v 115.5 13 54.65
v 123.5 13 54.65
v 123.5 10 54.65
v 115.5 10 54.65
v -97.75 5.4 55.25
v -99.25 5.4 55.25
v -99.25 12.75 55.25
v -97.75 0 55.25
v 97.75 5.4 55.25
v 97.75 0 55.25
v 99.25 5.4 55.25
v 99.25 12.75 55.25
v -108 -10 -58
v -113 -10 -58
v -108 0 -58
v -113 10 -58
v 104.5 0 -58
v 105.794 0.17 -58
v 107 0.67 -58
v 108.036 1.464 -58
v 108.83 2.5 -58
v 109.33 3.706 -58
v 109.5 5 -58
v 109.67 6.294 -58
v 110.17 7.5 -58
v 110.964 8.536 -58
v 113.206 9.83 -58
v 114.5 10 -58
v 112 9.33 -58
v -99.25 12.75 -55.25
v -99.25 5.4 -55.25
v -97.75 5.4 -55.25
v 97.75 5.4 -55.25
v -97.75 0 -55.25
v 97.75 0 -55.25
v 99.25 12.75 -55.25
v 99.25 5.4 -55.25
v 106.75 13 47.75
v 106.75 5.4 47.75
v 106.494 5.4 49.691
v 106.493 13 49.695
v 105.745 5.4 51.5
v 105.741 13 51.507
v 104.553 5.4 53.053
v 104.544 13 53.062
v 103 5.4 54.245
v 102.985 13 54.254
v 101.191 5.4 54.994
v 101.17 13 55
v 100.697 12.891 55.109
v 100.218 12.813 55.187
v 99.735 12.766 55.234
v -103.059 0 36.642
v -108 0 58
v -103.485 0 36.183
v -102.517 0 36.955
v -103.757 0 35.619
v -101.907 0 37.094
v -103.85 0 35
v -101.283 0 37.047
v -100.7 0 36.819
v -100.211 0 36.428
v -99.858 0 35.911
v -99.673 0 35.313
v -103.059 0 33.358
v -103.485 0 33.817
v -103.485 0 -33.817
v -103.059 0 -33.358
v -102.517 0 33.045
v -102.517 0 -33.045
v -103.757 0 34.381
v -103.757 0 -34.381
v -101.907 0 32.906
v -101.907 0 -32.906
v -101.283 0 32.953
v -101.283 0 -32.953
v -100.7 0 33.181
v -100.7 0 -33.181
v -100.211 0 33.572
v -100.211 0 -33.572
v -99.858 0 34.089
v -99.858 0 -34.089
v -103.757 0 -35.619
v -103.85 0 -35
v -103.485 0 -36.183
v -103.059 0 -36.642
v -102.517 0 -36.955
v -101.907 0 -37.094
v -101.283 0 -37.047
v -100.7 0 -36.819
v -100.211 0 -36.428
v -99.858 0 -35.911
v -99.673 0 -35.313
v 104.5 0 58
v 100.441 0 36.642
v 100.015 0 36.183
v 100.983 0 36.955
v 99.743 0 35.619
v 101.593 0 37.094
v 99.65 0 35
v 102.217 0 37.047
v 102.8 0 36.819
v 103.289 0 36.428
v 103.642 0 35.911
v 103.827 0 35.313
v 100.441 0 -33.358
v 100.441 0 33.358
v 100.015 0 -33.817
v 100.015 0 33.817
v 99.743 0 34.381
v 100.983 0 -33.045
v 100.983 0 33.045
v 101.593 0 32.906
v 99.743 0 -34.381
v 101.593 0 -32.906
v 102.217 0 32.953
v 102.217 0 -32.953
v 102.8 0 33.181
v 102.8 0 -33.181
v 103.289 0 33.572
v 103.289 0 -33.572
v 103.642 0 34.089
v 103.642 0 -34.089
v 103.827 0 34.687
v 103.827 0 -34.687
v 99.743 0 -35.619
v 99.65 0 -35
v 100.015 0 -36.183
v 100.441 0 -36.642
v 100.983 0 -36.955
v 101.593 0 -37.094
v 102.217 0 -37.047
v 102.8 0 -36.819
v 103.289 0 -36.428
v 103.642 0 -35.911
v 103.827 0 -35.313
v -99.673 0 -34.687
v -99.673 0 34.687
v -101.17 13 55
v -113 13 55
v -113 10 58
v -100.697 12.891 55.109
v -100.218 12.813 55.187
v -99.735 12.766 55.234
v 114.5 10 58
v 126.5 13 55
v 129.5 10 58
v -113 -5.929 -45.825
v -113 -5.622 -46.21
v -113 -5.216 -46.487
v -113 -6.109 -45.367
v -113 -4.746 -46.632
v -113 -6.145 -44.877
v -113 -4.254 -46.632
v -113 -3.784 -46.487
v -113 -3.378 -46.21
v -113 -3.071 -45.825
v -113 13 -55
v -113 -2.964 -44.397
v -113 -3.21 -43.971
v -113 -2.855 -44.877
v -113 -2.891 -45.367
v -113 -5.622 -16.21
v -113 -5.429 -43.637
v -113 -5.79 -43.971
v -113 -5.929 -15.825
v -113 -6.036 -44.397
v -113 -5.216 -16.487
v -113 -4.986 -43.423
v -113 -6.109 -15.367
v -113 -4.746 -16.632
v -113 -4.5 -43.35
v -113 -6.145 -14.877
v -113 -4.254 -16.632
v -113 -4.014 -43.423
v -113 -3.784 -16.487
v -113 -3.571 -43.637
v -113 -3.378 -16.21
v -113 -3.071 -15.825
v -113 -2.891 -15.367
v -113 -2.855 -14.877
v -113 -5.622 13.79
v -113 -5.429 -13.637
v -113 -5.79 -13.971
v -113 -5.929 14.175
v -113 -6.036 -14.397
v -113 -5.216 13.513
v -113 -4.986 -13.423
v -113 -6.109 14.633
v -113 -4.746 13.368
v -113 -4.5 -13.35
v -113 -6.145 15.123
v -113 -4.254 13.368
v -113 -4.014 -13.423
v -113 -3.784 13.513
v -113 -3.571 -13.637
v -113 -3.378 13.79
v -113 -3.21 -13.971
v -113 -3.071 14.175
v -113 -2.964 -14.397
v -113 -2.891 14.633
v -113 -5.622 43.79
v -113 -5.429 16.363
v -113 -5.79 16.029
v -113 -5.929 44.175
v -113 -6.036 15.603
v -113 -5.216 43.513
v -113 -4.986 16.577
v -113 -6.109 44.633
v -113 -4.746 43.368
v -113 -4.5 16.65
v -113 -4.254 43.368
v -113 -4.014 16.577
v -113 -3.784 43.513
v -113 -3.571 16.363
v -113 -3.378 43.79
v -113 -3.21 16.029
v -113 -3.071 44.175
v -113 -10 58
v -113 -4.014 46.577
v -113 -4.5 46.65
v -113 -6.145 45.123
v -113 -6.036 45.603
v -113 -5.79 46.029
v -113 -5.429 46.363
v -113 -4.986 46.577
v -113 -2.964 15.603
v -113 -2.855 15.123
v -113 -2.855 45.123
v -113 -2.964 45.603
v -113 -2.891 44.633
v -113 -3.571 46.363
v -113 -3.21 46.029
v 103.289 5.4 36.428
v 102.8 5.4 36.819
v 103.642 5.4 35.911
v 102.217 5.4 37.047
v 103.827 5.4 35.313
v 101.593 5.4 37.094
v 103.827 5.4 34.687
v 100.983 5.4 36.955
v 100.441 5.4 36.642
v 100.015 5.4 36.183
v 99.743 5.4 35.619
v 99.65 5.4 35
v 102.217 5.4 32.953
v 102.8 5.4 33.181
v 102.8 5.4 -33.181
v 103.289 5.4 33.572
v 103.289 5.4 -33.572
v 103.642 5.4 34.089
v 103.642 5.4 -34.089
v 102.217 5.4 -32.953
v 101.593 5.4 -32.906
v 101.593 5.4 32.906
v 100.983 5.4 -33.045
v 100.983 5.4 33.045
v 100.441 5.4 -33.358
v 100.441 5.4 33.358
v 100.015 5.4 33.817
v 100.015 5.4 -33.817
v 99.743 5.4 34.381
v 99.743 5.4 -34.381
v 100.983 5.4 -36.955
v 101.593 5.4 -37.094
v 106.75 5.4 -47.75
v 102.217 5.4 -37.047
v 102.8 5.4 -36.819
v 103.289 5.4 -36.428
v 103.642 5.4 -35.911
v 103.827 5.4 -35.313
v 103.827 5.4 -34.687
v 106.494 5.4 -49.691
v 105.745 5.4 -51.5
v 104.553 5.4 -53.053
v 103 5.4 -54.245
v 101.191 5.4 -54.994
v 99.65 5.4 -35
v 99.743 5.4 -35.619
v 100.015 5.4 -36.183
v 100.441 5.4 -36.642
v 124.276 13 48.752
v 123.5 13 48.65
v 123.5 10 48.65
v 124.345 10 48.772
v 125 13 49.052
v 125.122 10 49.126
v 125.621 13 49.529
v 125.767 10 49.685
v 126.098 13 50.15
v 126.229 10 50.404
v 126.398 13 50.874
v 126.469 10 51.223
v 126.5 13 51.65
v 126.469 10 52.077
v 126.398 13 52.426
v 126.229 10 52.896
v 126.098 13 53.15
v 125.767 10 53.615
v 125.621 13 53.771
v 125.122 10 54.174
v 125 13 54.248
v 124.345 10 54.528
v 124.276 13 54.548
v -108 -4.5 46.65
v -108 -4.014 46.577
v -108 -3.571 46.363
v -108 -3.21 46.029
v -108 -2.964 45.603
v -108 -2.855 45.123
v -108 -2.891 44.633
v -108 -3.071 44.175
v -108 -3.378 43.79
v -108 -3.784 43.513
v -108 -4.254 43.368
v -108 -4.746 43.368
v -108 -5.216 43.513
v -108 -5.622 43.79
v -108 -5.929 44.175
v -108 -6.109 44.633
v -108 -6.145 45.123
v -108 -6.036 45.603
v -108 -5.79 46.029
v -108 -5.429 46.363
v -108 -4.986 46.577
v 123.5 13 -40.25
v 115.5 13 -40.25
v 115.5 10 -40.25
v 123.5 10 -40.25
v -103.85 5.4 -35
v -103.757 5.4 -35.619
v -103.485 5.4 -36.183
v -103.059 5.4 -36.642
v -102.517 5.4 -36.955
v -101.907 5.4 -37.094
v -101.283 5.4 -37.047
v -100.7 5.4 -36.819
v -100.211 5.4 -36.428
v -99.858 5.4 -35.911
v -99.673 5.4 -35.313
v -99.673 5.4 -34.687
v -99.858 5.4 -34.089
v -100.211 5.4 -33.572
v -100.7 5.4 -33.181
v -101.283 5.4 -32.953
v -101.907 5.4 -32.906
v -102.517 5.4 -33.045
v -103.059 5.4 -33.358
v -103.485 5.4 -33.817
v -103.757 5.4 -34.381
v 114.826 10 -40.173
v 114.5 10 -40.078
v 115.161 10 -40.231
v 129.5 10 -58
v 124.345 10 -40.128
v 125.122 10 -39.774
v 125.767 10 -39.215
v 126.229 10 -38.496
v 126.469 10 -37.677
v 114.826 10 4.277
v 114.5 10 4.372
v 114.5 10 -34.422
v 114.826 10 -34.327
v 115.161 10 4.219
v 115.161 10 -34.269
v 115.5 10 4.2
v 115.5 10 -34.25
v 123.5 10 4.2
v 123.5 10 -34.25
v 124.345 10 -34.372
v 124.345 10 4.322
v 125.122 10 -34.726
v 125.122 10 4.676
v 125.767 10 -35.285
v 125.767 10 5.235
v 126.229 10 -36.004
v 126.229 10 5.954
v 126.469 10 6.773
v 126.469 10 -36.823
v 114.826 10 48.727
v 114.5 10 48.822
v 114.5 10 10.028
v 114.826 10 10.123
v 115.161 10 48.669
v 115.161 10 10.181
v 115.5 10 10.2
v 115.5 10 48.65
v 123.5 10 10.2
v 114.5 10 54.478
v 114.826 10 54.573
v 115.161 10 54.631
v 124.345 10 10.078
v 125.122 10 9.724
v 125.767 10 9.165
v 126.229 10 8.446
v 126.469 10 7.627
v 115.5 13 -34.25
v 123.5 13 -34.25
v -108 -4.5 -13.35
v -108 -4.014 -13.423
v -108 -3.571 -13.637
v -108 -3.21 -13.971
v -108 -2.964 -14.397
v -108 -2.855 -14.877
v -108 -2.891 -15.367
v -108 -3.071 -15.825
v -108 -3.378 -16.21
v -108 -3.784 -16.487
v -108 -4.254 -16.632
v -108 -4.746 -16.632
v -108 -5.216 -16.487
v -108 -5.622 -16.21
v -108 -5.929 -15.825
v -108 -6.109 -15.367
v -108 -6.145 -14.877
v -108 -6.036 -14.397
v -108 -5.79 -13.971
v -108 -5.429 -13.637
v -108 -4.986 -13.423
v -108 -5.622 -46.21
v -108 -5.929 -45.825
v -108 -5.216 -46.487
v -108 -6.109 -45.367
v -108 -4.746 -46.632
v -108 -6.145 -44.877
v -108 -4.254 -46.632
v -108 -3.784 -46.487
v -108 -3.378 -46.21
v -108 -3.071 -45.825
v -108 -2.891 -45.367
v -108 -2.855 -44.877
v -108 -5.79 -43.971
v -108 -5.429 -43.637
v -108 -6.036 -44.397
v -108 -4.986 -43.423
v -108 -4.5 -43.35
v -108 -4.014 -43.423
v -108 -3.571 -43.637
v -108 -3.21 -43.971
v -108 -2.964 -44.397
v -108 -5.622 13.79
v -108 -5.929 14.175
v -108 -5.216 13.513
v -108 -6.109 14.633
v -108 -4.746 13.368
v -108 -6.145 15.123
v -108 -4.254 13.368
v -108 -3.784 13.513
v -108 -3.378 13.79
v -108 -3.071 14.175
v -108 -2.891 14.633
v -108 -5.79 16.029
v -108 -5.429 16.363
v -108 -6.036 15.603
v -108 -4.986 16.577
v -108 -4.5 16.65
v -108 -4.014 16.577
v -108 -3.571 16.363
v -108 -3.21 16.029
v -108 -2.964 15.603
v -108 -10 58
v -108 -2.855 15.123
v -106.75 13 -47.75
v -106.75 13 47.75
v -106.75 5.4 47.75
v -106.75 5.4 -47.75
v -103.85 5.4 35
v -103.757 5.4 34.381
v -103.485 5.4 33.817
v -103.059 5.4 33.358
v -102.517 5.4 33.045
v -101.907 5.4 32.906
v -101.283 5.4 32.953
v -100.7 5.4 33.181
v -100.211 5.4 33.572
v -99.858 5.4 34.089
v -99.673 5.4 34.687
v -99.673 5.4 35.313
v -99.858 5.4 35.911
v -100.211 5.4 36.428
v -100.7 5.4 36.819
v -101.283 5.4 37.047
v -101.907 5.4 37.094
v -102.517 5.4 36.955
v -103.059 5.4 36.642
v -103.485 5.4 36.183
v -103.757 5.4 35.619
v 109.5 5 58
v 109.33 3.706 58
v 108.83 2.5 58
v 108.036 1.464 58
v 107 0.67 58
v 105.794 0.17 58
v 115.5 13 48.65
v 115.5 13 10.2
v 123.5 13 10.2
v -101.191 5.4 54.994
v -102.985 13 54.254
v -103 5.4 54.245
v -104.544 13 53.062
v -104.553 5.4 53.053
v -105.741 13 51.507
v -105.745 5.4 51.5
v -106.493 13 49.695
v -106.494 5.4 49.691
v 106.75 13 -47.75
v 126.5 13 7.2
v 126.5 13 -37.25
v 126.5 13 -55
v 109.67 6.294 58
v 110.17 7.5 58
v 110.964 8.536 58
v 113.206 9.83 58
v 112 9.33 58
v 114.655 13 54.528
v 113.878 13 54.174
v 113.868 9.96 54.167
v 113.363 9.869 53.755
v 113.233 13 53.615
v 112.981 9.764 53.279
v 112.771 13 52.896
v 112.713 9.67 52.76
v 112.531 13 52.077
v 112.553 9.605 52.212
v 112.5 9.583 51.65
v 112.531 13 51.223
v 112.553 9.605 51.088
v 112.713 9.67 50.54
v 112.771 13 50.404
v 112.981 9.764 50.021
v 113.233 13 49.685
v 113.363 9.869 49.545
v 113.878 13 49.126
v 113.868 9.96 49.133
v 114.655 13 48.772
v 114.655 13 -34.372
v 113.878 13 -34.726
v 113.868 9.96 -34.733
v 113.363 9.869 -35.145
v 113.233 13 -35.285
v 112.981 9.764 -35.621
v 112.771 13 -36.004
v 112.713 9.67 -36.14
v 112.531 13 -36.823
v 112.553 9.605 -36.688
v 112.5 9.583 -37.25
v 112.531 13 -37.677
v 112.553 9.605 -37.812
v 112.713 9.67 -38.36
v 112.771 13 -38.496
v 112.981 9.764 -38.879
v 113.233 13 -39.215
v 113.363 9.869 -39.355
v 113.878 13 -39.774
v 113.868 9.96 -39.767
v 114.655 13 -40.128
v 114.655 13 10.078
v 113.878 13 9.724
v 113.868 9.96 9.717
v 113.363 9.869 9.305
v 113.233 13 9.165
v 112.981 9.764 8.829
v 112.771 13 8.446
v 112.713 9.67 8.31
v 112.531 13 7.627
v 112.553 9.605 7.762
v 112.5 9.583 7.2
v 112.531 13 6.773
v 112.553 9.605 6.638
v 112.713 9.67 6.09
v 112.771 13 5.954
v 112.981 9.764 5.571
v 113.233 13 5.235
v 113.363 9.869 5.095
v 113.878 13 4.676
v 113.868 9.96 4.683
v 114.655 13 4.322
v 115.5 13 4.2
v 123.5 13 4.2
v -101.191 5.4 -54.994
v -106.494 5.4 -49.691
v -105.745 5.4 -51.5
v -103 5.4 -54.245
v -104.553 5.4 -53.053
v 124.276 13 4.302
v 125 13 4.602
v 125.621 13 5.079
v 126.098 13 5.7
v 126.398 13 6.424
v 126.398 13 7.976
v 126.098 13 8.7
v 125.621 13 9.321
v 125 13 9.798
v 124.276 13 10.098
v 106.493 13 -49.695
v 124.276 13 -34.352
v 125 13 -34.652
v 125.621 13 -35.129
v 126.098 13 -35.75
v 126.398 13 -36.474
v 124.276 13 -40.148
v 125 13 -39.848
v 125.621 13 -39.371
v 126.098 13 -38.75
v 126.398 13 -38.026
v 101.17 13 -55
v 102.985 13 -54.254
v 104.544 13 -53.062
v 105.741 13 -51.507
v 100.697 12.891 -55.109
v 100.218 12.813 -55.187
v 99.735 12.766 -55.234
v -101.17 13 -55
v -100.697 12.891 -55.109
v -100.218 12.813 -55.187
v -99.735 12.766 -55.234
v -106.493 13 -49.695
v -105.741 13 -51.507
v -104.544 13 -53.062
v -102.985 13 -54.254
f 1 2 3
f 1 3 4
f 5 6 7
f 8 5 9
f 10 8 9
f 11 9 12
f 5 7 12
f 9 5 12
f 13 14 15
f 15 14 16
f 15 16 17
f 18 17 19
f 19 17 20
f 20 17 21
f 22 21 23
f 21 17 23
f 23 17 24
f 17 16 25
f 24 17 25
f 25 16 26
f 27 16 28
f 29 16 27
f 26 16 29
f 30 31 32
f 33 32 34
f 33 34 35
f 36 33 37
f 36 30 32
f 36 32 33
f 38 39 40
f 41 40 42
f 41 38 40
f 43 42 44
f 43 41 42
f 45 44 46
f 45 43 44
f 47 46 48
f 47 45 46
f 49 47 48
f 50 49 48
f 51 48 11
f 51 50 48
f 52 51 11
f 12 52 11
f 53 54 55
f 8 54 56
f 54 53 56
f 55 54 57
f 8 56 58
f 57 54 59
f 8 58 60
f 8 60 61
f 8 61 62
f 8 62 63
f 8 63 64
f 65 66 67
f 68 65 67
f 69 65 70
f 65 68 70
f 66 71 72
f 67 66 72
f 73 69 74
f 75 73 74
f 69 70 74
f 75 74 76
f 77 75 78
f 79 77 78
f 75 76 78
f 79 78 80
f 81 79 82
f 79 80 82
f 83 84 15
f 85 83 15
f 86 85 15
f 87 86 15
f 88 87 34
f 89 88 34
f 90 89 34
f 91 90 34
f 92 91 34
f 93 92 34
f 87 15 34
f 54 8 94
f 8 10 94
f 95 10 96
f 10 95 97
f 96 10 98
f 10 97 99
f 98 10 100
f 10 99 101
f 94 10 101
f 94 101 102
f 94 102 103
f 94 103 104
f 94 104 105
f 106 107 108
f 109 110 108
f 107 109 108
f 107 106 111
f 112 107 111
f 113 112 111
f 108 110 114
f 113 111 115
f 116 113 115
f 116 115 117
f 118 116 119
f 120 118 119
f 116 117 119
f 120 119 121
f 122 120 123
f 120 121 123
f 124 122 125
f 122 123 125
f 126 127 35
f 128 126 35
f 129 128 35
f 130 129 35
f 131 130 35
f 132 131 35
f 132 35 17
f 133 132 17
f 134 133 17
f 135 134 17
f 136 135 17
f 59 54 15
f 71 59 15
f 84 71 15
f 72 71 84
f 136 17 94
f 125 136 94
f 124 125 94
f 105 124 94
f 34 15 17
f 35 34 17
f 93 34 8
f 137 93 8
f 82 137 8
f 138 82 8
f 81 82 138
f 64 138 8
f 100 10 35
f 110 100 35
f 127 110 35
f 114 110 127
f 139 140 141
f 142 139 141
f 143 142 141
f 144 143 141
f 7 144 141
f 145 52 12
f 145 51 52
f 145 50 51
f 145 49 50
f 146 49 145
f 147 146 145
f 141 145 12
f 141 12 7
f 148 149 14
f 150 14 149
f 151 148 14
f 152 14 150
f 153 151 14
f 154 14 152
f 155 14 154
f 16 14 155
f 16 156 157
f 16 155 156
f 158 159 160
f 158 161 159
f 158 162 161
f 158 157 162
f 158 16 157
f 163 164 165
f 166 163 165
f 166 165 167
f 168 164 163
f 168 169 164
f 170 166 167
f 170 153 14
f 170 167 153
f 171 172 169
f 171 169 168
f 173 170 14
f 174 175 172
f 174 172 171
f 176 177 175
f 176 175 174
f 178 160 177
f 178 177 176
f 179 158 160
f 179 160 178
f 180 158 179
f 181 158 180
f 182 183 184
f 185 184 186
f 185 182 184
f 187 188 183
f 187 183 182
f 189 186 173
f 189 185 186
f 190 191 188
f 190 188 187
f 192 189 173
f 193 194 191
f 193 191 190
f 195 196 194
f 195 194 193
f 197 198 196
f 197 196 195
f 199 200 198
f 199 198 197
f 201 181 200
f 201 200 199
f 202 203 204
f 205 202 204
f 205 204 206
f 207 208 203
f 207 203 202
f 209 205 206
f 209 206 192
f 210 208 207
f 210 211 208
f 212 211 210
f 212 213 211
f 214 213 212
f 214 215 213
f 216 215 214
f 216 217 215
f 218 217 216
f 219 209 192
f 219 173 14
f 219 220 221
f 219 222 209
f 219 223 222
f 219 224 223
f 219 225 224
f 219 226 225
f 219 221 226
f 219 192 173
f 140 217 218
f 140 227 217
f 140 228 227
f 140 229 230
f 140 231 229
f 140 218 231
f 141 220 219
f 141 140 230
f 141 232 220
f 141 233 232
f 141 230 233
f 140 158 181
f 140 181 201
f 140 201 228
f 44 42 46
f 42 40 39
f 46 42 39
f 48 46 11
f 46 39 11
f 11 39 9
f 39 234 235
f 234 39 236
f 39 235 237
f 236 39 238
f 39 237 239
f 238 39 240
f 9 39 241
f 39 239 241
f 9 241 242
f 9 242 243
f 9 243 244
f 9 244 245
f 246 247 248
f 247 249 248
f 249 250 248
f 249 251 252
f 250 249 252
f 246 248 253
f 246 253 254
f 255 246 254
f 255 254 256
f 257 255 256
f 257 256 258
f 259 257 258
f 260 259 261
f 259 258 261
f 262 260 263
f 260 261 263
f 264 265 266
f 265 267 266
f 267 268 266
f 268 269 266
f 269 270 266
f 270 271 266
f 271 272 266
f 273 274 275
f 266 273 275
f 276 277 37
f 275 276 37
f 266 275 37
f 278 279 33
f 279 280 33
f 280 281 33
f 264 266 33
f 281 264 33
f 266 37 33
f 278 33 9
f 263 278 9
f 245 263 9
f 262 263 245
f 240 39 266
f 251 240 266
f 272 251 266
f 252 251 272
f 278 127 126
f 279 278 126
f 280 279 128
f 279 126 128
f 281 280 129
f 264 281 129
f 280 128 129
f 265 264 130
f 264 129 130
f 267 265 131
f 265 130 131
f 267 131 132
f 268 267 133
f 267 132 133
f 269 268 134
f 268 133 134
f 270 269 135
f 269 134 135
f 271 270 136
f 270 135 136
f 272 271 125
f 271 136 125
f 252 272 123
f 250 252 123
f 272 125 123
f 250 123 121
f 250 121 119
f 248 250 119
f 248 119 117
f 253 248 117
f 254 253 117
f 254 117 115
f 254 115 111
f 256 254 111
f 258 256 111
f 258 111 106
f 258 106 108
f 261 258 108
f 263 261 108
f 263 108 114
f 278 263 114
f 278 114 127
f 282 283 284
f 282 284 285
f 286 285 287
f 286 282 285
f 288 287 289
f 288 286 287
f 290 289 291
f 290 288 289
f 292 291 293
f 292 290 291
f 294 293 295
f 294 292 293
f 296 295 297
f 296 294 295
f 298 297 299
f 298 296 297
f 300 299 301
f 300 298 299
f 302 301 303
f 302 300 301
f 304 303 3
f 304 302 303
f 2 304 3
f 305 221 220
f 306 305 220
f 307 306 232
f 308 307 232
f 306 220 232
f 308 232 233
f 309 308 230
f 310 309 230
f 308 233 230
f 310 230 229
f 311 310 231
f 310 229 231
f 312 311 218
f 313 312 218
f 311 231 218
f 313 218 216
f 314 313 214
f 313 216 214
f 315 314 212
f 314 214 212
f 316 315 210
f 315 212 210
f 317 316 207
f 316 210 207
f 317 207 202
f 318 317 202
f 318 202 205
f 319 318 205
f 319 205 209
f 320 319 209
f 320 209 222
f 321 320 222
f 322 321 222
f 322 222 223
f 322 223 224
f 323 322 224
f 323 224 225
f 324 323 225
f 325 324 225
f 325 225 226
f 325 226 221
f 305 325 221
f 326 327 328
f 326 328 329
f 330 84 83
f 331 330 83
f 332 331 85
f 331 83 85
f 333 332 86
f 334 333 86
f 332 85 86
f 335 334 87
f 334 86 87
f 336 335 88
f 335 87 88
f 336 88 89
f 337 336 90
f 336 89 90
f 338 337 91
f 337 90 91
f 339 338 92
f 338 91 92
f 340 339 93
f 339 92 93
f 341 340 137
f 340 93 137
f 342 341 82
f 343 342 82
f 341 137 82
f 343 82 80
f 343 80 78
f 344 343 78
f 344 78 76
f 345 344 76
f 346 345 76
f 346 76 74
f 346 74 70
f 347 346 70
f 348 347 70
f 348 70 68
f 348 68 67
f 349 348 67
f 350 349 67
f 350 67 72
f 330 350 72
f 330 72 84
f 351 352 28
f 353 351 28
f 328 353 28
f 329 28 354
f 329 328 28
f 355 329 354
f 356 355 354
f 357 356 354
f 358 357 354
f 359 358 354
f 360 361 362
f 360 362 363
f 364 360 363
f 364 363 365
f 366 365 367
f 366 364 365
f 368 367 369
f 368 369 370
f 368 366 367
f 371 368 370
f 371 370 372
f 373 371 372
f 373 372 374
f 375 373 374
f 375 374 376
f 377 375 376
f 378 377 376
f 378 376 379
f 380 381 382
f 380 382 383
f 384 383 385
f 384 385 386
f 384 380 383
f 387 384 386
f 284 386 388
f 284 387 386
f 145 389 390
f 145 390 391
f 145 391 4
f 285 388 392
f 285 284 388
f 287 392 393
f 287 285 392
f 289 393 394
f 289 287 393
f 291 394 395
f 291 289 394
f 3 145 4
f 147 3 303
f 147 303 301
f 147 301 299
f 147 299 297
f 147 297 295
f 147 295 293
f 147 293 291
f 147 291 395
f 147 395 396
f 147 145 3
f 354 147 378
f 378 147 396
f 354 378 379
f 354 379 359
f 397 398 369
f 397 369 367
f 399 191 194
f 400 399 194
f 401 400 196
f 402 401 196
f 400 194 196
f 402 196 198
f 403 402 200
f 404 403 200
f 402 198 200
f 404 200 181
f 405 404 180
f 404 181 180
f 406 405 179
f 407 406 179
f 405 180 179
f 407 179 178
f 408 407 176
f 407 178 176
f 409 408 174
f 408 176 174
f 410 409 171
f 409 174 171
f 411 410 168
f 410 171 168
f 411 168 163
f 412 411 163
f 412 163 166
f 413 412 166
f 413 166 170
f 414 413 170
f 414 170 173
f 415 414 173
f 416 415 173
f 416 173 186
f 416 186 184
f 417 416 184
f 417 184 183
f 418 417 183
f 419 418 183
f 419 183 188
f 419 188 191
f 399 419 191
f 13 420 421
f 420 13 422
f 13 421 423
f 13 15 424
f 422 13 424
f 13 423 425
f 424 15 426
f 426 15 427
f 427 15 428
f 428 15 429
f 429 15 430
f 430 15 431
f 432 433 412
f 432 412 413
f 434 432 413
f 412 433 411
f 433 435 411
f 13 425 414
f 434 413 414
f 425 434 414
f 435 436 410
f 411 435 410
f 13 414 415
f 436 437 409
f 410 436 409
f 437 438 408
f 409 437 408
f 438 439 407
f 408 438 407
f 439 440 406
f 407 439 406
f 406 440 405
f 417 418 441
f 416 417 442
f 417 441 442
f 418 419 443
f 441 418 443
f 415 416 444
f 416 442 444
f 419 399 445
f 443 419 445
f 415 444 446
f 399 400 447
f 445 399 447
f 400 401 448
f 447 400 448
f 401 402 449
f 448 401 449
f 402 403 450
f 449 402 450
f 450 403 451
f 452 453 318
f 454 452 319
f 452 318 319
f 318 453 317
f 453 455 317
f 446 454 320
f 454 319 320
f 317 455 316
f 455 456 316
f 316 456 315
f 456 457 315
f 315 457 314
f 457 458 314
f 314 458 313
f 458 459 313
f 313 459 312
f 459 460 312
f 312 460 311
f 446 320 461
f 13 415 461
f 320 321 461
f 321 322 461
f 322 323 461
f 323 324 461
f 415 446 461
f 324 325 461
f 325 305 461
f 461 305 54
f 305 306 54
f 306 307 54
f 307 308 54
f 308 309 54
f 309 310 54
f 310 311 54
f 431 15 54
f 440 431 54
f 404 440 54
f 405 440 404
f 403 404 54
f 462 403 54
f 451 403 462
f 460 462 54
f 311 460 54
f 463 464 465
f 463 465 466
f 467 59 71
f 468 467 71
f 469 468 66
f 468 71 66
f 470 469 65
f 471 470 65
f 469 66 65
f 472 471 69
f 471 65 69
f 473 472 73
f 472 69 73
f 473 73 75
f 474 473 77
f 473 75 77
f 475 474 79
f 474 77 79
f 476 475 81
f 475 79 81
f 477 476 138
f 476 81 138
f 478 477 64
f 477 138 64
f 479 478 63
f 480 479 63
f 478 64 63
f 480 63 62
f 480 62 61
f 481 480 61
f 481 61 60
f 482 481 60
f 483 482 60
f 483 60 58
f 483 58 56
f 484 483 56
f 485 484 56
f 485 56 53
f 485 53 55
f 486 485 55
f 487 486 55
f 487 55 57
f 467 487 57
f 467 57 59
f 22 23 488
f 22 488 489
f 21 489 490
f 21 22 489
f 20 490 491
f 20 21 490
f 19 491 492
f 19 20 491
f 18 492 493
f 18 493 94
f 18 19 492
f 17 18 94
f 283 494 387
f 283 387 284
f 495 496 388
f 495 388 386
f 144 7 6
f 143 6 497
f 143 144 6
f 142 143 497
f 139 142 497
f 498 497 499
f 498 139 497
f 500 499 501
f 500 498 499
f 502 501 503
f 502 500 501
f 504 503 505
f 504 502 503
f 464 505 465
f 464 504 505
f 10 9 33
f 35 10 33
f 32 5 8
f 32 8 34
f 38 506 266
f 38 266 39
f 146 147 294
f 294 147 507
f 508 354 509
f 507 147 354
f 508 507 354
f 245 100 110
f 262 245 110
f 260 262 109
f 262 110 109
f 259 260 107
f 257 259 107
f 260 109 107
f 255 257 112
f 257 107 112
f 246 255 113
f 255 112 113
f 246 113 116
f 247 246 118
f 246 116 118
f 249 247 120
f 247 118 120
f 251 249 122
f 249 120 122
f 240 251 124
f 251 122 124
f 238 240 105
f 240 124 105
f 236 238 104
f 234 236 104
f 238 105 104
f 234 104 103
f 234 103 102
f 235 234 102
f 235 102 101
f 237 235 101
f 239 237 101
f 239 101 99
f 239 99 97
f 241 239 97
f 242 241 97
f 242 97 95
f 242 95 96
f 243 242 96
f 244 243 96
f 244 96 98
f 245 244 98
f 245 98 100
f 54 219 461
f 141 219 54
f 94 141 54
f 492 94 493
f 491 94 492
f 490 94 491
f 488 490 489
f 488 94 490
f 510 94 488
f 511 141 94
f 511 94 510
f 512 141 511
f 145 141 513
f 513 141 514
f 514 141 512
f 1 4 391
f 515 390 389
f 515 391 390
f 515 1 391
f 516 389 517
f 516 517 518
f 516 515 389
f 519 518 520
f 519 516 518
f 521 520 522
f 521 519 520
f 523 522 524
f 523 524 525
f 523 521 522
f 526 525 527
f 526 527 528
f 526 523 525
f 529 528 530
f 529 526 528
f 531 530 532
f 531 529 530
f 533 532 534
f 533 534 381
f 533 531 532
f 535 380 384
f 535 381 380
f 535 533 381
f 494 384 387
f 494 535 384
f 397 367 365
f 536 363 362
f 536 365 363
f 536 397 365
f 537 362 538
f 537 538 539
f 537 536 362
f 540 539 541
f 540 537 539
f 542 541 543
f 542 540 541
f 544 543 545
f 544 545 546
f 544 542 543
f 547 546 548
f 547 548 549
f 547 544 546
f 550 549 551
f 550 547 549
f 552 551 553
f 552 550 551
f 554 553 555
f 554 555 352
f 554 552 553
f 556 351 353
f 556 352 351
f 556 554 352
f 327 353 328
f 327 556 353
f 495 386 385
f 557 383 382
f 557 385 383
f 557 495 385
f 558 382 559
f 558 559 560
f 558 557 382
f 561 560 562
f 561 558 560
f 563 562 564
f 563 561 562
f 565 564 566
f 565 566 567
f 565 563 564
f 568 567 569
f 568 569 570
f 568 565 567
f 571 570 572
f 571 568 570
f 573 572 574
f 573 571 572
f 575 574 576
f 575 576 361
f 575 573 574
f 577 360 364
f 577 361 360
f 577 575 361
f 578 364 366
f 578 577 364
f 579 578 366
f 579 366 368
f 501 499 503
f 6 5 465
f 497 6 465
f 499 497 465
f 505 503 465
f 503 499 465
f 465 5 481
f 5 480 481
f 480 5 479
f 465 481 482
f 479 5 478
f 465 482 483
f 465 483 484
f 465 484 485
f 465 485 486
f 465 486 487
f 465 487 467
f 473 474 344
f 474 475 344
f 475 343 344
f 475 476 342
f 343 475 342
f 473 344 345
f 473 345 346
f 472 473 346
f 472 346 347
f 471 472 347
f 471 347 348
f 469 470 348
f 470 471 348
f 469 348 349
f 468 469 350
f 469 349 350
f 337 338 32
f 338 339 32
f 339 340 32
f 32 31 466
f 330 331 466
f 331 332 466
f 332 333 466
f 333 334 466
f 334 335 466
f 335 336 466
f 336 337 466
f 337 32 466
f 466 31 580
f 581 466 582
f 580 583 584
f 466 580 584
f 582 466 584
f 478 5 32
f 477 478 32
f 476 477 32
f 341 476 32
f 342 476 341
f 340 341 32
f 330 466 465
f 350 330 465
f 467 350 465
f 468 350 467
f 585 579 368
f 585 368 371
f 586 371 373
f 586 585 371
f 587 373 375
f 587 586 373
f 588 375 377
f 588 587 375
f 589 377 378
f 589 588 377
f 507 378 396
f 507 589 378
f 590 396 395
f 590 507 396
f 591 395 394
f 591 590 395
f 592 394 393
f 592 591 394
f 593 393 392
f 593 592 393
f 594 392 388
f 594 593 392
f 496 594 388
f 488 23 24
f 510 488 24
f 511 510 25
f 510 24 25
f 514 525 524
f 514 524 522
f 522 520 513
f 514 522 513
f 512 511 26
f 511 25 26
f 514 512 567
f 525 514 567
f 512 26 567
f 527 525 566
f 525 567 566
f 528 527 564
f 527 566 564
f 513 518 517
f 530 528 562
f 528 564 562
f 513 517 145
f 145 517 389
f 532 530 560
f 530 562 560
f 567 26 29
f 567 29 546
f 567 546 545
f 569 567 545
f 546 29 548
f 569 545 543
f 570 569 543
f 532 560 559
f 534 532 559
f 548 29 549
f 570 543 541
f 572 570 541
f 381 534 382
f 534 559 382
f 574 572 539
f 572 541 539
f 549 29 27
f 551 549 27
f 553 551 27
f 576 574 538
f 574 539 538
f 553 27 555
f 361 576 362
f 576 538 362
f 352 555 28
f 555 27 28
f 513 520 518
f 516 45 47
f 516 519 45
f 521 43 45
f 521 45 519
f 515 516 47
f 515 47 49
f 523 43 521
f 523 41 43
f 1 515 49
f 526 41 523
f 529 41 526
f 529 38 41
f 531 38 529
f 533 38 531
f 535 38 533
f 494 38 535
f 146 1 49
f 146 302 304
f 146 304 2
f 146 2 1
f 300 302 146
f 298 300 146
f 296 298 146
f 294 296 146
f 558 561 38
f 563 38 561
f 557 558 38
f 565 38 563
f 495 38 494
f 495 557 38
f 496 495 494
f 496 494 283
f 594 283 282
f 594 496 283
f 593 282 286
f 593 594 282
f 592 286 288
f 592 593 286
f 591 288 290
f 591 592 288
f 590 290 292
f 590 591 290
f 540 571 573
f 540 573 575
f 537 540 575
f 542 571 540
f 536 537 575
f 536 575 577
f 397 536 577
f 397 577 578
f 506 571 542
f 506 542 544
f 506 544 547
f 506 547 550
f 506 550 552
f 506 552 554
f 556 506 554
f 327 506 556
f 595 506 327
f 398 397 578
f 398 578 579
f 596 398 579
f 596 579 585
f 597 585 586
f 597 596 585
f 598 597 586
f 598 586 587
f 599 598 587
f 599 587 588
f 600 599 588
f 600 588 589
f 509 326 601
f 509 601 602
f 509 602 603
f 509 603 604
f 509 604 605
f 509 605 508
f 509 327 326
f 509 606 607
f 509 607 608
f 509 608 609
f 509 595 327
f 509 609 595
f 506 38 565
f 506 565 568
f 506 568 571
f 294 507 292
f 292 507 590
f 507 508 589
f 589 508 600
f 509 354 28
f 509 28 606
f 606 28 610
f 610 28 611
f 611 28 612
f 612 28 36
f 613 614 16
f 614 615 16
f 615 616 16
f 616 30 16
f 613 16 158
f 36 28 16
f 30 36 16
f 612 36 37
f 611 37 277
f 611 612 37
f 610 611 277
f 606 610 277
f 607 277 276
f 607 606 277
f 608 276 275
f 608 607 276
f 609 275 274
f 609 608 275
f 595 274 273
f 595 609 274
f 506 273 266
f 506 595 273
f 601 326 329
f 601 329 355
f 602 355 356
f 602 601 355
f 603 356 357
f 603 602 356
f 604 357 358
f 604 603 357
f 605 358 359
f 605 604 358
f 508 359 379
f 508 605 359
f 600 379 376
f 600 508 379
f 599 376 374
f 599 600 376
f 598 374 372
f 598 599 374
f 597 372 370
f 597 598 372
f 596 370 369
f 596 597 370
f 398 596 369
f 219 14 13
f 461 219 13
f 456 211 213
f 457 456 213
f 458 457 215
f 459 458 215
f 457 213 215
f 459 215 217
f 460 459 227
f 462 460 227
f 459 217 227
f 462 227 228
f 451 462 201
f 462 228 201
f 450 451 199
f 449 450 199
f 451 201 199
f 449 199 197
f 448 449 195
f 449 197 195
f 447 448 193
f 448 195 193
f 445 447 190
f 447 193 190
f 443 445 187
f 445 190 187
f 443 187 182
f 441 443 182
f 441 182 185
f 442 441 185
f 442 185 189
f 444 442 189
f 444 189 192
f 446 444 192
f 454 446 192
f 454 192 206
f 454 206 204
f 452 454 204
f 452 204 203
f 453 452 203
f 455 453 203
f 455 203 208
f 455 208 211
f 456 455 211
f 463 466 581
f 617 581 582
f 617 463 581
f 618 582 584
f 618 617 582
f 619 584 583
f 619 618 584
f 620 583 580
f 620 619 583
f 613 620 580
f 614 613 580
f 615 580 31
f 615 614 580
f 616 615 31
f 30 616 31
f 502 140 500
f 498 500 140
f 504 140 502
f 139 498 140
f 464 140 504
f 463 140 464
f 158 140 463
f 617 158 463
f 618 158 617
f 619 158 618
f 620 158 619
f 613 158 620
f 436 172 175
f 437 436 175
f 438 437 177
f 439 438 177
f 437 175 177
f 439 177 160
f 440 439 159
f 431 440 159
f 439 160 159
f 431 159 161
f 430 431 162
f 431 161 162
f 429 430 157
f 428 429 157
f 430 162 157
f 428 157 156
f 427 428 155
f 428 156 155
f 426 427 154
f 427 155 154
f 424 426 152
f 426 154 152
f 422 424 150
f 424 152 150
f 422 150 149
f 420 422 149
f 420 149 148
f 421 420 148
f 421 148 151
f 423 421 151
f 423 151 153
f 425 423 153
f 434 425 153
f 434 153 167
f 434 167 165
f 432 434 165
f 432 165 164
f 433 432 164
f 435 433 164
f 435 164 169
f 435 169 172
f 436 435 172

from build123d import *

# Parameters (mm, degrees)
SKETCH1_W                        = 242.5
SKETCH1_H                        = 116
BOSS_EXTRUDE1_DEPTH              = 13
CUT_EXTRUDE1_DEPTH               = 7.6
F_1_8_27_NPSM_TAPPED_HOLE1_D     = 5
F_1_8_27_NPSM_TAPPED_HOLE1_DEPTH = 22.99
F_1_8_27_NPSM_TAPPED_HOLE1_TIP   = 1.502151548
SKETCH6_W                        = 195.5
SKETCH6_H                        = 110.5
CUT_EXTRUDE2_DEPTH               = 143.098592533
SKETCH32_W                       = 20
SKETCH32_H                       = 116
CUT_EXTRUDE10_DEPTH              = 10
FILLET1_START                    = -59
FILLET1_DEPTH                    = 118
FILLET1_START_2                  = -58
FILLET1_2_DEPTH                  = 116
CHAMFER1_SIZE                    = 3
SKETCH36_W                       = 5
SKETCH36_H                       = 116
BOSS_EXTRUDE2_DEPTH              = 10
M5X0_8_TAPPED_HOLE1_D            = 4.2
M5X0_8_TAPPED_HOLE1_DEPTH        = 12.4
M5X0_8_TAPPED_HOLE1_TIP          = 1.2618073
M4X0_7_TAPPED_HOLE1_D            = 3.3
CUT_EXTRUDE11_DEPTH              = 144.747173885


with BuildPart() as part:
    # Sketch1 → Boss-Extrude1 (new body)
    with BuildSketch(Plane(origin=(0, 0, 0), x_dir=(1, 0, 0), z_dir=(0, 1, 0))):
        with Locations((8.25, 0)):
            Rectangle(SKETCH1_W, SKETCH1_H)
    extrude(amount=BOSS_EXTRUDE1_DEPTH)

    # Sketch2 → Cut-Extrude1 (cut)
    with BuildSketch(Plane(origin=(0, 13, 0), x_dir=(1, 0, 0), z_dir=(0, 1, 0))):
        with BuildLine():
            Line((-99.25, 55.25), (99.25, 55.25))
            ThreePointArc((99.25, 55.25), (104.553300859, 53.053300859), (106.75, 47.75))
            Line((106.75, 47.75), (106.75, -47.75))
            ThreePointArc((106.75, -47.75), (104.553300859, -53.053300859), (99.25, -55.25))
            Line((99.25, -55.25), (-99.25, -55.25))
            ThreePointArc((-99.25, -55.25), (-104.553300859, -53.053300859), (-106.75, -47.75))
            Line((-106.75, -47.75), (-106.75, 47.75))
            ThreePointArc((-106.75, 47.75), (-104.553300859, 53.053300859), (-99.25, 55.25))
        make_face()
    extrude(amount=-CUT_EXTRUDE1_DEPTH, mode=Mode.SUBTRACT)

    # 1/8-27 NPSM Tapped Hole1
    with Locations(Plane(origin=(0, 5.4, 0), x_dir=(1, 0, 0), z_dir=(0, 1, 0))):
        with Locations((-74.86, 30.93), (51.34, 30.93), (51.34, -34.72), (-74.86, -34.72)):
            Hole(F_1_8_27_NPSM_TAPPED_HOLE1_D / 2, depth=F_1_8_27_NPSM_TAPPED_HOLE1_DEPTH)
            with Locations((0, 0, -(F_1_8_27_NPSM_TAPPED_HOLE1_DEPTH + F_1_8_27_NPSM_TAPPED_HOLE1_TIP / 2))):  # 118° drill point
                Cone(0, F_1_8_27_NPSM_TAPPED_HOLE1_D / 2, F_1_8_27_NPSM_TAPPED_HOLE1_TIP, mode=Mode.SUBTRACT)

    # Sketch6 → Cut-Extrude2 (cut, through all)
    with BuildSketch(Plane(origin=(0, 5.4, 0), x_dir=(1, 0, 0), z_dir=(0, 1, 0))):
        Rectangle(SKETCH6_W, SKETCH6_H)
    extrude(amount=-CUT_EXTRUDE2_DEPTH, mode=Mode.SUBTRACT)

    # Sketch32 → Cut-Extrude10 (cut)
    with BuildSketch(Plane.XZ):
        with Locations((119.5, 0)):
            Rectangle(SKETCH32_W, SKETCH32_H)
    extrude(amount=-CUT_EXTRUDE10_DEPTH, mode=Mode.SUBTRACT)

    # Fillet1: read off the stored shape, not the designer's step
    # Fillet1 outline → Fillet1 (cut)
    with BuildSketch(Plane.XY.offset(FILLET1_START)):
        with BuildLine():
            Line((109.5, 0), (109.5, 5))
            ThreePointArc((109.5, 5), (108.035533906, 1.464466094), (104.5, 0))
            Line((104.5, 0), (109.5, 0))
        make_face()
    extrude(amount=FILLET1_DEPTH, mode=Mode.SUBTRACT)

    # Fillet1 2 outline → Fillet1 2 (add)
    with BuildSketch(Plane.XY.offset(FILLET1_START_2)):
        with BuildLine():
            ThreePointArc((109.5, 5), (110.964466094, 8.535533906), (114.5, 10))
            Line((114.5, 10), (109.5, 10))
            Line((109.5, 10), (109.5, 5))
        make_face()
    extrude(amount=FILLET1_2_DEPTH)

    # Chamfer1
    # the kernel refuses this chamfer: 3 mm, written as the material it takes off along each edge
    with BuildSketch(Plane(origin=(137.215048964, 13, 58), x_dir=(0, 0, -1), z_dir=(-1, 0, 0))) as chamfer1_piece_1:
        Polygon((CHAMFER1_SIZE, 0), (0, CHAMFER1_SIZE), (0, 0), align=None)
    extrude(amount=257.930097928, mode=Mode.SUBTRACT)
    with BuildSketch(Plane(origin=(129.5, 13, -65.715048964), x_dir=(0, -1, 0), z_dir=(0, 0, 1))) as chamfer1_piece_2:
        Polygon((CHAMFER1_SIZE, 0), (0, -CHAMFER1_SIZE), (0, 0), align=None)
    extrude(amount=131.430097928, mode=Mode.SUBTRACT)
    with BuildSketch(Plane(origin=(-120.715048964, 13, -58), x_dir=(0, -1, 0), z_dir=(1, 0, 0))) as chamfer1_piece_3:
        Polygon((CHAMFER1_SIZE, 0), (0, -CHAMFER1_SIZE), (0, 0), align=None)
    extrude(amount=257.930097928, mode=Mode.SUBTRACT)

    # Sketch36 → Boss-Extrude2 (add)
    with BuildSketch(Plane.XZ):
        with Locations((-110.5, 0)):
            Rectangle(SKETCH36_W, SKETCH36_H)
    extrude(amount=BOSS_EXTRUDE2_DEPTH)

    # M5x0.8 Tapped Hole1
    with Locations(Plane(origin=(0, 5.4, 0), x_dir=(1, 0, 0), z_dir=(0, 1, 0))):
        with Locations((-101.75, 35), (-101.75, -35), (101.75, 35), (101.75, -35)):
            Hole(M5X0_8_TAPPED_HOLE1_D / 2, depth=M5X0_8_TAPPED_HOLE1_DEPTH)
            with Locations((0, 0, -(M5X0_8_TAPPED_HOLE1_DEPTH + M5X0_8_TAPPED_HOLE1_TIP / 2))):  # 118° drill point
                Cone(0, M5X0_8_TAPPED_HOLE1_D / 2, M5X0_8_TAPPED_HOLE1_TIP, mode=Mode.SUBTRACT)

    # M4x0.7 Tapped Hole1 (through all)
    with Locations(Plane(origin=(-108, 0, 0), x_dir=(0, 0, -1), z_dir=(1, 0, 0))):
        with Locations((-15, -4.5), (15, -4.5), (45, -4.5), (-45, -4.5)):
            Hole(M4X0_7_TAPPED_HOLE1_D / 2)

    # Sketch43 → Cut-Extrude11 (cut, through all)
    with BuildSketch(Plane(origin=(0, 13, 0), x_dir=(1, 0, 0), z_dir=(0, 1, 0))):
        with BuildLine():
            Line((115.5, -48.65), (123.5, -48.65))
            ThreePointArc((123.5, -48.65), (126.5, -51.65), (123.5, -54.65))
            Line((123.5, -54.65), (115.5, -54.65))
            ThreePointArc((115.5, -54.65), (112.5, -51.65), (115.5, -48.65))
        make_face()
        with BuildLine():
            Line((115.5, -4.2), (123.5, -4.2))
            ThreePointArc((123.5, -4.2), (126.5, -7.2), (123.5, -10.2))
            Line((123.5, -10.2), (115.5, -10.2))
            ThreePointArc((115.5, -10.2), (112.5, -7.2), (115.5, -4.2))
        make_face()
        with BuildLine():
            Line((115.5, 40.25), (123.5, 40.25))
            ThreePointArc((123.5, 40.25), (126.5, 37.25), (123.5, 34.25))
            Line((123.5, 34.25), (115.5, 34.25))
            ThreePointArc((115.5, 34.25), (112.5, 37.25), (115.5, 40.25))
        make_face()
    extrude(amount=-CUT_EXTRUDE11_DEPTH, mode=Mode.SUBTRACT)


solid = part.part
